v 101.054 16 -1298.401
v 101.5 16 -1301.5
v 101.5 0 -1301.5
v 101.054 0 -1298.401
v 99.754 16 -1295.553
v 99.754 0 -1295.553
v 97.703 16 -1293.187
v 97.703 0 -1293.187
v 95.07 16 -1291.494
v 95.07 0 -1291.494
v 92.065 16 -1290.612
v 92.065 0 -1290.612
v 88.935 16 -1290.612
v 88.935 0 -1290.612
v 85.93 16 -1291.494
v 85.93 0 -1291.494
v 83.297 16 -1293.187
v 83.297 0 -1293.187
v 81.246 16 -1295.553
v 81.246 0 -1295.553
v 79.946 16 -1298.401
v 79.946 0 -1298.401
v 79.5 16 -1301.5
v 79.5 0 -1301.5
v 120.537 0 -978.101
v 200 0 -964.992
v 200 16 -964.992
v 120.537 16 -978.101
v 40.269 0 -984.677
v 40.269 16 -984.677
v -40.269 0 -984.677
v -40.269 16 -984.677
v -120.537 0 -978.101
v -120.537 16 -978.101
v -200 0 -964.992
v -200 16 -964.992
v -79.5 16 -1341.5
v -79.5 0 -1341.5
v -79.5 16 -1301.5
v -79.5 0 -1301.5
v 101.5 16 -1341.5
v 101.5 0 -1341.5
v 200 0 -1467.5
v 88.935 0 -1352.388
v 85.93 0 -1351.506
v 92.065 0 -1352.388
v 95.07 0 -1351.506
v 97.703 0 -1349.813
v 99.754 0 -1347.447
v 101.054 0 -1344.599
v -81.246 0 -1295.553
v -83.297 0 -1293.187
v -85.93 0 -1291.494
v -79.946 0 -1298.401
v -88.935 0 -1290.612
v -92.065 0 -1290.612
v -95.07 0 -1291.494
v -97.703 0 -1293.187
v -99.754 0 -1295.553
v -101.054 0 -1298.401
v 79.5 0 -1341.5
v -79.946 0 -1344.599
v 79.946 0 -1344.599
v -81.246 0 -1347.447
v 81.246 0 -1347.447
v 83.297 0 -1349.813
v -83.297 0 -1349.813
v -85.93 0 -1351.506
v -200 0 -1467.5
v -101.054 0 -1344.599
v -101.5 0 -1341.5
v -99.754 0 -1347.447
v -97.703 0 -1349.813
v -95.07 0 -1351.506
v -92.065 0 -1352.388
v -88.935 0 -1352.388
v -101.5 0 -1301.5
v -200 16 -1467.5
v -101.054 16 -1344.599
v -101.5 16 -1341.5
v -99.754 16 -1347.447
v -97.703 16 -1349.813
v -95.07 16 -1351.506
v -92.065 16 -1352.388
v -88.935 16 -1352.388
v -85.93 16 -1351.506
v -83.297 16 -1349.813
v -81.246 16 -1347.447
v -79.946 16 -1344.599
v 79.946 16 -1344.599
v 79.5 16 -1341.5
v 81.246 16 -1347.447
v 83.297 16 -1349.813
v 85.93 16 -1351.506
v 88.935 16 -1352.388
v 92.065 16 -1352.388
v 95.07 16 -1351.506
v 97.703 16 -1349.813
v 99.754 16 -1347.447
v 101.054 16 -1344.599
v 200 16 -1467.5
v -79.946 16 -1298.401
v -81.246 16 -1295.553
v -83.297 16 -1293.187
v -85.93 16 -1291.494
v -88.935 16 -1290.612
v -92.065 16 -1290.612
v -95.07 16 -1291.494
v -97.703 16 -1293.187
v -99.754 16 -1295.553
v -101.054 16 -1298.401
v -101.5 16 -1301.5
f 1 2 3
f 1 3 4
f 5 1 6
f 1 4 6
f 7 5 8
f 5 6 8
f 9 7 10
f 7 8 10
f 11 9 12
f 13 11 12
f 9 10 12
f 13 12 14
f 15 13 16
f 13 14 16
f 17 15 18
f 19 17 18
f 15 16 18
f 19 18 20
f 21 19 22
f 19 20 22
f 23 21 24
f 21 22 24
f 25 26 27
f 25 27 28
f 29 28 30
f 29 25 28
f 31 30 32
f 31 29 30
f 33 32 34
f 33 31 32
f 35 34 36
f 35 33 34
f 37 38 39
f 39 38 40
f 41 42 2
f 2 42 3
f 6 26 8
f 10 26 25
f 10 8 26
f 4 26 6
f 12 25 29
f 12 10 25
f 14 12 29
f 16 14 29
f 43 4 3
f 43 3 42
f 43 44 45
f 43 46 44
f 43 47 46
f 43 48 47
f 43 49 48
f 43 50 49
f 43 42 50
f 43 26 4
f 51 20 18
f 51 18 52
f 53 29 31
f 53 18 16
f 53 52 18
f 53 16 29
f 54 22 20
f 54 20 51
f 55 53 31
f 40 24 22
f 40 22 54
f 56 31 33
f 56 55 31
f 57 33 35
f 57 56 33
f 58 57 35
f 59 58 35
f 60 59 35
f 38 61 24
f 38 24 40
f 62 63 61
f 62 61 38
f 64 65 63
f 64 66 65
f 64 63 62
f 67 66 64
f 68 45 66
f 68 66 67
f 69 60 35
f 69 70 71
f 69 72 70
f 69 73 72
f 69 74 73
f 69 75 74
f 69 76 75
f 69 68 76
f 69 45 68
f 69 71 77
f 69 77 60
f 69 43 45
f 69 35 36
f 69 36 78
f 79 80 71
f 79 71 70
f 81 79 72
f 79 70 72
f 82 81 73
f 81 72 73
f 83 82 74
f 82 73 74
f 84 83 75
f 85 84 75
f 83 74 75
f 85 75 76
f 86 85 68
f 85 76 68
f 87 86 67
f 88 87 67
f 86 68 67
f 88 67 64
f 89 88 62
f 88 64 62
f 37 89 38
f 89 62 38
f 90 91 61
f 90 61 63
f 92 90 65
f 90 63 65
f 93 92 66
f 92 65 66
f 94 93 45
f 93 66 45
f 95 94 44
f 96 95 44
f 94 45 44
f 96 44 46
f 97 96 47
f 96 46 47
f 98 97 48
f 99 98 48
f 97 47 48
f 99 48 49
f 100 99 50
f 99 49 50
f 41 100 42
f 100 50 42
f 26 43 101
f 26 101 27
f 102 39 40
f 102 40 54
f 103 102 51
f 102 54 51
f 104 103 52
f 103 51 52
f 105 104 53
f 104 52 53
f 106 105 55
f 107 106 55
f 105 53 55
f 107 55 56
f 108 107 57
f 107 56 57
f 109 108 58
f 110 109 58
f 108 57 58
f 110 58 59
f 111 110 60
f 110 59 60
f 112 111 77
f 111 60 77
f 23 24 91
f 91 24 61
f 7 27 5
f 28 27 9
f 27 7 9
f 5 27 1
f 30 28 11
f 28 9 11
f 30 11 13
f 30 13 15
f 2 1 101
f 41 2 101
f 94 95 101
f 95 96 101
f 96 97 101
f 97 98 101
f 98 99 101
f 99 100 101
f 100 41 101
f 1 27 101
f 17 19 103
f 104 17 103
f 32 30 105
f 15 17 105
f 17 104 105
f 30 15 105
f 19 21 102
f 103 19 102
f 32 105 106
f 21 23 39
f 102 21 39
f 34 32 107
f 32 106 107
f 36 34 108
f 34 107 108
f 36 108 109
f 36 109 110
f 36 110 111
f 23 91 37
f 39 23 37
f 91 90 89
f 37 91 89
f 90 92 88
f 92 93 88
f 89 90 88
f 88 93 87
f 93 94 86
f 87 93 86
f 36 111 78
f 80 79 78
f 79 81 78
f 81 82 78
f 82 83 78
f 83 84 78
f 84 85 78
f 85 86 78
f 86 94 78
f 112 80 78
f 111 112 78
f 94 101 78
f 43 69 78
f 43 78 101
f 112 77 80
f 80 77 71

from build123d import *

# Parameters (mm, degrees)
SM_BASE_FLANGE_1_DEPTH = 16


# Sheet-metal steps are written as plain solids
with BuildPart() as part:
    # Sketch 1 → 基体-法兰1 (new body)
    with BuildSketch(Plane(origin=(0, 0, 0), x_dir=(1, 0, 0), z_dir=(0, 1, 0))):
        with BuildLine():
            Line((-200, 964.992357483), (-200, 1467.5))
            Line((-200, 1467.5), (200, 1467.5))
            Line((200, 1467.5), (200, 964.992357483))
            ThreePointArc((200, 964.992357483), (0, 985.5), (-200, 964.992357483))
        make_face()
        with BuildLine():
            Line((-79.5, 1341.5), (-79.5, 1301.5))
            ThreePointArc((-79.5, 1301.5), (-90.5, 1290.5), (-101.5, 1301.5))
            Line((-101.5, 1301.5), (-101.5, 1341.5))
            ThreePointArc((-101.5, 1341.5), (-90.5, 1352.5), (-79.5, 1341.5))
        make_face(mode=Mode.SUBTRACT)
        with BuildLine():
            Line((79.5, 1301.5), (79.5, 1341.5))
            ThreePointArc((79.5, 1341.5), (90.5, 1352.5), (101.5, 1341.5))
            Line((101.5, 1341.5), (101.5, 1301.5))
            ThreePointArc((101.5, 1301.5), (90.5, 1290.5), (79.5, 1301.5))
        make_face(mode=Mode.SUBTRACT)
    extrude(amount=SM_BASE_FLANGE_1_DEPTH)


solid = part.part
